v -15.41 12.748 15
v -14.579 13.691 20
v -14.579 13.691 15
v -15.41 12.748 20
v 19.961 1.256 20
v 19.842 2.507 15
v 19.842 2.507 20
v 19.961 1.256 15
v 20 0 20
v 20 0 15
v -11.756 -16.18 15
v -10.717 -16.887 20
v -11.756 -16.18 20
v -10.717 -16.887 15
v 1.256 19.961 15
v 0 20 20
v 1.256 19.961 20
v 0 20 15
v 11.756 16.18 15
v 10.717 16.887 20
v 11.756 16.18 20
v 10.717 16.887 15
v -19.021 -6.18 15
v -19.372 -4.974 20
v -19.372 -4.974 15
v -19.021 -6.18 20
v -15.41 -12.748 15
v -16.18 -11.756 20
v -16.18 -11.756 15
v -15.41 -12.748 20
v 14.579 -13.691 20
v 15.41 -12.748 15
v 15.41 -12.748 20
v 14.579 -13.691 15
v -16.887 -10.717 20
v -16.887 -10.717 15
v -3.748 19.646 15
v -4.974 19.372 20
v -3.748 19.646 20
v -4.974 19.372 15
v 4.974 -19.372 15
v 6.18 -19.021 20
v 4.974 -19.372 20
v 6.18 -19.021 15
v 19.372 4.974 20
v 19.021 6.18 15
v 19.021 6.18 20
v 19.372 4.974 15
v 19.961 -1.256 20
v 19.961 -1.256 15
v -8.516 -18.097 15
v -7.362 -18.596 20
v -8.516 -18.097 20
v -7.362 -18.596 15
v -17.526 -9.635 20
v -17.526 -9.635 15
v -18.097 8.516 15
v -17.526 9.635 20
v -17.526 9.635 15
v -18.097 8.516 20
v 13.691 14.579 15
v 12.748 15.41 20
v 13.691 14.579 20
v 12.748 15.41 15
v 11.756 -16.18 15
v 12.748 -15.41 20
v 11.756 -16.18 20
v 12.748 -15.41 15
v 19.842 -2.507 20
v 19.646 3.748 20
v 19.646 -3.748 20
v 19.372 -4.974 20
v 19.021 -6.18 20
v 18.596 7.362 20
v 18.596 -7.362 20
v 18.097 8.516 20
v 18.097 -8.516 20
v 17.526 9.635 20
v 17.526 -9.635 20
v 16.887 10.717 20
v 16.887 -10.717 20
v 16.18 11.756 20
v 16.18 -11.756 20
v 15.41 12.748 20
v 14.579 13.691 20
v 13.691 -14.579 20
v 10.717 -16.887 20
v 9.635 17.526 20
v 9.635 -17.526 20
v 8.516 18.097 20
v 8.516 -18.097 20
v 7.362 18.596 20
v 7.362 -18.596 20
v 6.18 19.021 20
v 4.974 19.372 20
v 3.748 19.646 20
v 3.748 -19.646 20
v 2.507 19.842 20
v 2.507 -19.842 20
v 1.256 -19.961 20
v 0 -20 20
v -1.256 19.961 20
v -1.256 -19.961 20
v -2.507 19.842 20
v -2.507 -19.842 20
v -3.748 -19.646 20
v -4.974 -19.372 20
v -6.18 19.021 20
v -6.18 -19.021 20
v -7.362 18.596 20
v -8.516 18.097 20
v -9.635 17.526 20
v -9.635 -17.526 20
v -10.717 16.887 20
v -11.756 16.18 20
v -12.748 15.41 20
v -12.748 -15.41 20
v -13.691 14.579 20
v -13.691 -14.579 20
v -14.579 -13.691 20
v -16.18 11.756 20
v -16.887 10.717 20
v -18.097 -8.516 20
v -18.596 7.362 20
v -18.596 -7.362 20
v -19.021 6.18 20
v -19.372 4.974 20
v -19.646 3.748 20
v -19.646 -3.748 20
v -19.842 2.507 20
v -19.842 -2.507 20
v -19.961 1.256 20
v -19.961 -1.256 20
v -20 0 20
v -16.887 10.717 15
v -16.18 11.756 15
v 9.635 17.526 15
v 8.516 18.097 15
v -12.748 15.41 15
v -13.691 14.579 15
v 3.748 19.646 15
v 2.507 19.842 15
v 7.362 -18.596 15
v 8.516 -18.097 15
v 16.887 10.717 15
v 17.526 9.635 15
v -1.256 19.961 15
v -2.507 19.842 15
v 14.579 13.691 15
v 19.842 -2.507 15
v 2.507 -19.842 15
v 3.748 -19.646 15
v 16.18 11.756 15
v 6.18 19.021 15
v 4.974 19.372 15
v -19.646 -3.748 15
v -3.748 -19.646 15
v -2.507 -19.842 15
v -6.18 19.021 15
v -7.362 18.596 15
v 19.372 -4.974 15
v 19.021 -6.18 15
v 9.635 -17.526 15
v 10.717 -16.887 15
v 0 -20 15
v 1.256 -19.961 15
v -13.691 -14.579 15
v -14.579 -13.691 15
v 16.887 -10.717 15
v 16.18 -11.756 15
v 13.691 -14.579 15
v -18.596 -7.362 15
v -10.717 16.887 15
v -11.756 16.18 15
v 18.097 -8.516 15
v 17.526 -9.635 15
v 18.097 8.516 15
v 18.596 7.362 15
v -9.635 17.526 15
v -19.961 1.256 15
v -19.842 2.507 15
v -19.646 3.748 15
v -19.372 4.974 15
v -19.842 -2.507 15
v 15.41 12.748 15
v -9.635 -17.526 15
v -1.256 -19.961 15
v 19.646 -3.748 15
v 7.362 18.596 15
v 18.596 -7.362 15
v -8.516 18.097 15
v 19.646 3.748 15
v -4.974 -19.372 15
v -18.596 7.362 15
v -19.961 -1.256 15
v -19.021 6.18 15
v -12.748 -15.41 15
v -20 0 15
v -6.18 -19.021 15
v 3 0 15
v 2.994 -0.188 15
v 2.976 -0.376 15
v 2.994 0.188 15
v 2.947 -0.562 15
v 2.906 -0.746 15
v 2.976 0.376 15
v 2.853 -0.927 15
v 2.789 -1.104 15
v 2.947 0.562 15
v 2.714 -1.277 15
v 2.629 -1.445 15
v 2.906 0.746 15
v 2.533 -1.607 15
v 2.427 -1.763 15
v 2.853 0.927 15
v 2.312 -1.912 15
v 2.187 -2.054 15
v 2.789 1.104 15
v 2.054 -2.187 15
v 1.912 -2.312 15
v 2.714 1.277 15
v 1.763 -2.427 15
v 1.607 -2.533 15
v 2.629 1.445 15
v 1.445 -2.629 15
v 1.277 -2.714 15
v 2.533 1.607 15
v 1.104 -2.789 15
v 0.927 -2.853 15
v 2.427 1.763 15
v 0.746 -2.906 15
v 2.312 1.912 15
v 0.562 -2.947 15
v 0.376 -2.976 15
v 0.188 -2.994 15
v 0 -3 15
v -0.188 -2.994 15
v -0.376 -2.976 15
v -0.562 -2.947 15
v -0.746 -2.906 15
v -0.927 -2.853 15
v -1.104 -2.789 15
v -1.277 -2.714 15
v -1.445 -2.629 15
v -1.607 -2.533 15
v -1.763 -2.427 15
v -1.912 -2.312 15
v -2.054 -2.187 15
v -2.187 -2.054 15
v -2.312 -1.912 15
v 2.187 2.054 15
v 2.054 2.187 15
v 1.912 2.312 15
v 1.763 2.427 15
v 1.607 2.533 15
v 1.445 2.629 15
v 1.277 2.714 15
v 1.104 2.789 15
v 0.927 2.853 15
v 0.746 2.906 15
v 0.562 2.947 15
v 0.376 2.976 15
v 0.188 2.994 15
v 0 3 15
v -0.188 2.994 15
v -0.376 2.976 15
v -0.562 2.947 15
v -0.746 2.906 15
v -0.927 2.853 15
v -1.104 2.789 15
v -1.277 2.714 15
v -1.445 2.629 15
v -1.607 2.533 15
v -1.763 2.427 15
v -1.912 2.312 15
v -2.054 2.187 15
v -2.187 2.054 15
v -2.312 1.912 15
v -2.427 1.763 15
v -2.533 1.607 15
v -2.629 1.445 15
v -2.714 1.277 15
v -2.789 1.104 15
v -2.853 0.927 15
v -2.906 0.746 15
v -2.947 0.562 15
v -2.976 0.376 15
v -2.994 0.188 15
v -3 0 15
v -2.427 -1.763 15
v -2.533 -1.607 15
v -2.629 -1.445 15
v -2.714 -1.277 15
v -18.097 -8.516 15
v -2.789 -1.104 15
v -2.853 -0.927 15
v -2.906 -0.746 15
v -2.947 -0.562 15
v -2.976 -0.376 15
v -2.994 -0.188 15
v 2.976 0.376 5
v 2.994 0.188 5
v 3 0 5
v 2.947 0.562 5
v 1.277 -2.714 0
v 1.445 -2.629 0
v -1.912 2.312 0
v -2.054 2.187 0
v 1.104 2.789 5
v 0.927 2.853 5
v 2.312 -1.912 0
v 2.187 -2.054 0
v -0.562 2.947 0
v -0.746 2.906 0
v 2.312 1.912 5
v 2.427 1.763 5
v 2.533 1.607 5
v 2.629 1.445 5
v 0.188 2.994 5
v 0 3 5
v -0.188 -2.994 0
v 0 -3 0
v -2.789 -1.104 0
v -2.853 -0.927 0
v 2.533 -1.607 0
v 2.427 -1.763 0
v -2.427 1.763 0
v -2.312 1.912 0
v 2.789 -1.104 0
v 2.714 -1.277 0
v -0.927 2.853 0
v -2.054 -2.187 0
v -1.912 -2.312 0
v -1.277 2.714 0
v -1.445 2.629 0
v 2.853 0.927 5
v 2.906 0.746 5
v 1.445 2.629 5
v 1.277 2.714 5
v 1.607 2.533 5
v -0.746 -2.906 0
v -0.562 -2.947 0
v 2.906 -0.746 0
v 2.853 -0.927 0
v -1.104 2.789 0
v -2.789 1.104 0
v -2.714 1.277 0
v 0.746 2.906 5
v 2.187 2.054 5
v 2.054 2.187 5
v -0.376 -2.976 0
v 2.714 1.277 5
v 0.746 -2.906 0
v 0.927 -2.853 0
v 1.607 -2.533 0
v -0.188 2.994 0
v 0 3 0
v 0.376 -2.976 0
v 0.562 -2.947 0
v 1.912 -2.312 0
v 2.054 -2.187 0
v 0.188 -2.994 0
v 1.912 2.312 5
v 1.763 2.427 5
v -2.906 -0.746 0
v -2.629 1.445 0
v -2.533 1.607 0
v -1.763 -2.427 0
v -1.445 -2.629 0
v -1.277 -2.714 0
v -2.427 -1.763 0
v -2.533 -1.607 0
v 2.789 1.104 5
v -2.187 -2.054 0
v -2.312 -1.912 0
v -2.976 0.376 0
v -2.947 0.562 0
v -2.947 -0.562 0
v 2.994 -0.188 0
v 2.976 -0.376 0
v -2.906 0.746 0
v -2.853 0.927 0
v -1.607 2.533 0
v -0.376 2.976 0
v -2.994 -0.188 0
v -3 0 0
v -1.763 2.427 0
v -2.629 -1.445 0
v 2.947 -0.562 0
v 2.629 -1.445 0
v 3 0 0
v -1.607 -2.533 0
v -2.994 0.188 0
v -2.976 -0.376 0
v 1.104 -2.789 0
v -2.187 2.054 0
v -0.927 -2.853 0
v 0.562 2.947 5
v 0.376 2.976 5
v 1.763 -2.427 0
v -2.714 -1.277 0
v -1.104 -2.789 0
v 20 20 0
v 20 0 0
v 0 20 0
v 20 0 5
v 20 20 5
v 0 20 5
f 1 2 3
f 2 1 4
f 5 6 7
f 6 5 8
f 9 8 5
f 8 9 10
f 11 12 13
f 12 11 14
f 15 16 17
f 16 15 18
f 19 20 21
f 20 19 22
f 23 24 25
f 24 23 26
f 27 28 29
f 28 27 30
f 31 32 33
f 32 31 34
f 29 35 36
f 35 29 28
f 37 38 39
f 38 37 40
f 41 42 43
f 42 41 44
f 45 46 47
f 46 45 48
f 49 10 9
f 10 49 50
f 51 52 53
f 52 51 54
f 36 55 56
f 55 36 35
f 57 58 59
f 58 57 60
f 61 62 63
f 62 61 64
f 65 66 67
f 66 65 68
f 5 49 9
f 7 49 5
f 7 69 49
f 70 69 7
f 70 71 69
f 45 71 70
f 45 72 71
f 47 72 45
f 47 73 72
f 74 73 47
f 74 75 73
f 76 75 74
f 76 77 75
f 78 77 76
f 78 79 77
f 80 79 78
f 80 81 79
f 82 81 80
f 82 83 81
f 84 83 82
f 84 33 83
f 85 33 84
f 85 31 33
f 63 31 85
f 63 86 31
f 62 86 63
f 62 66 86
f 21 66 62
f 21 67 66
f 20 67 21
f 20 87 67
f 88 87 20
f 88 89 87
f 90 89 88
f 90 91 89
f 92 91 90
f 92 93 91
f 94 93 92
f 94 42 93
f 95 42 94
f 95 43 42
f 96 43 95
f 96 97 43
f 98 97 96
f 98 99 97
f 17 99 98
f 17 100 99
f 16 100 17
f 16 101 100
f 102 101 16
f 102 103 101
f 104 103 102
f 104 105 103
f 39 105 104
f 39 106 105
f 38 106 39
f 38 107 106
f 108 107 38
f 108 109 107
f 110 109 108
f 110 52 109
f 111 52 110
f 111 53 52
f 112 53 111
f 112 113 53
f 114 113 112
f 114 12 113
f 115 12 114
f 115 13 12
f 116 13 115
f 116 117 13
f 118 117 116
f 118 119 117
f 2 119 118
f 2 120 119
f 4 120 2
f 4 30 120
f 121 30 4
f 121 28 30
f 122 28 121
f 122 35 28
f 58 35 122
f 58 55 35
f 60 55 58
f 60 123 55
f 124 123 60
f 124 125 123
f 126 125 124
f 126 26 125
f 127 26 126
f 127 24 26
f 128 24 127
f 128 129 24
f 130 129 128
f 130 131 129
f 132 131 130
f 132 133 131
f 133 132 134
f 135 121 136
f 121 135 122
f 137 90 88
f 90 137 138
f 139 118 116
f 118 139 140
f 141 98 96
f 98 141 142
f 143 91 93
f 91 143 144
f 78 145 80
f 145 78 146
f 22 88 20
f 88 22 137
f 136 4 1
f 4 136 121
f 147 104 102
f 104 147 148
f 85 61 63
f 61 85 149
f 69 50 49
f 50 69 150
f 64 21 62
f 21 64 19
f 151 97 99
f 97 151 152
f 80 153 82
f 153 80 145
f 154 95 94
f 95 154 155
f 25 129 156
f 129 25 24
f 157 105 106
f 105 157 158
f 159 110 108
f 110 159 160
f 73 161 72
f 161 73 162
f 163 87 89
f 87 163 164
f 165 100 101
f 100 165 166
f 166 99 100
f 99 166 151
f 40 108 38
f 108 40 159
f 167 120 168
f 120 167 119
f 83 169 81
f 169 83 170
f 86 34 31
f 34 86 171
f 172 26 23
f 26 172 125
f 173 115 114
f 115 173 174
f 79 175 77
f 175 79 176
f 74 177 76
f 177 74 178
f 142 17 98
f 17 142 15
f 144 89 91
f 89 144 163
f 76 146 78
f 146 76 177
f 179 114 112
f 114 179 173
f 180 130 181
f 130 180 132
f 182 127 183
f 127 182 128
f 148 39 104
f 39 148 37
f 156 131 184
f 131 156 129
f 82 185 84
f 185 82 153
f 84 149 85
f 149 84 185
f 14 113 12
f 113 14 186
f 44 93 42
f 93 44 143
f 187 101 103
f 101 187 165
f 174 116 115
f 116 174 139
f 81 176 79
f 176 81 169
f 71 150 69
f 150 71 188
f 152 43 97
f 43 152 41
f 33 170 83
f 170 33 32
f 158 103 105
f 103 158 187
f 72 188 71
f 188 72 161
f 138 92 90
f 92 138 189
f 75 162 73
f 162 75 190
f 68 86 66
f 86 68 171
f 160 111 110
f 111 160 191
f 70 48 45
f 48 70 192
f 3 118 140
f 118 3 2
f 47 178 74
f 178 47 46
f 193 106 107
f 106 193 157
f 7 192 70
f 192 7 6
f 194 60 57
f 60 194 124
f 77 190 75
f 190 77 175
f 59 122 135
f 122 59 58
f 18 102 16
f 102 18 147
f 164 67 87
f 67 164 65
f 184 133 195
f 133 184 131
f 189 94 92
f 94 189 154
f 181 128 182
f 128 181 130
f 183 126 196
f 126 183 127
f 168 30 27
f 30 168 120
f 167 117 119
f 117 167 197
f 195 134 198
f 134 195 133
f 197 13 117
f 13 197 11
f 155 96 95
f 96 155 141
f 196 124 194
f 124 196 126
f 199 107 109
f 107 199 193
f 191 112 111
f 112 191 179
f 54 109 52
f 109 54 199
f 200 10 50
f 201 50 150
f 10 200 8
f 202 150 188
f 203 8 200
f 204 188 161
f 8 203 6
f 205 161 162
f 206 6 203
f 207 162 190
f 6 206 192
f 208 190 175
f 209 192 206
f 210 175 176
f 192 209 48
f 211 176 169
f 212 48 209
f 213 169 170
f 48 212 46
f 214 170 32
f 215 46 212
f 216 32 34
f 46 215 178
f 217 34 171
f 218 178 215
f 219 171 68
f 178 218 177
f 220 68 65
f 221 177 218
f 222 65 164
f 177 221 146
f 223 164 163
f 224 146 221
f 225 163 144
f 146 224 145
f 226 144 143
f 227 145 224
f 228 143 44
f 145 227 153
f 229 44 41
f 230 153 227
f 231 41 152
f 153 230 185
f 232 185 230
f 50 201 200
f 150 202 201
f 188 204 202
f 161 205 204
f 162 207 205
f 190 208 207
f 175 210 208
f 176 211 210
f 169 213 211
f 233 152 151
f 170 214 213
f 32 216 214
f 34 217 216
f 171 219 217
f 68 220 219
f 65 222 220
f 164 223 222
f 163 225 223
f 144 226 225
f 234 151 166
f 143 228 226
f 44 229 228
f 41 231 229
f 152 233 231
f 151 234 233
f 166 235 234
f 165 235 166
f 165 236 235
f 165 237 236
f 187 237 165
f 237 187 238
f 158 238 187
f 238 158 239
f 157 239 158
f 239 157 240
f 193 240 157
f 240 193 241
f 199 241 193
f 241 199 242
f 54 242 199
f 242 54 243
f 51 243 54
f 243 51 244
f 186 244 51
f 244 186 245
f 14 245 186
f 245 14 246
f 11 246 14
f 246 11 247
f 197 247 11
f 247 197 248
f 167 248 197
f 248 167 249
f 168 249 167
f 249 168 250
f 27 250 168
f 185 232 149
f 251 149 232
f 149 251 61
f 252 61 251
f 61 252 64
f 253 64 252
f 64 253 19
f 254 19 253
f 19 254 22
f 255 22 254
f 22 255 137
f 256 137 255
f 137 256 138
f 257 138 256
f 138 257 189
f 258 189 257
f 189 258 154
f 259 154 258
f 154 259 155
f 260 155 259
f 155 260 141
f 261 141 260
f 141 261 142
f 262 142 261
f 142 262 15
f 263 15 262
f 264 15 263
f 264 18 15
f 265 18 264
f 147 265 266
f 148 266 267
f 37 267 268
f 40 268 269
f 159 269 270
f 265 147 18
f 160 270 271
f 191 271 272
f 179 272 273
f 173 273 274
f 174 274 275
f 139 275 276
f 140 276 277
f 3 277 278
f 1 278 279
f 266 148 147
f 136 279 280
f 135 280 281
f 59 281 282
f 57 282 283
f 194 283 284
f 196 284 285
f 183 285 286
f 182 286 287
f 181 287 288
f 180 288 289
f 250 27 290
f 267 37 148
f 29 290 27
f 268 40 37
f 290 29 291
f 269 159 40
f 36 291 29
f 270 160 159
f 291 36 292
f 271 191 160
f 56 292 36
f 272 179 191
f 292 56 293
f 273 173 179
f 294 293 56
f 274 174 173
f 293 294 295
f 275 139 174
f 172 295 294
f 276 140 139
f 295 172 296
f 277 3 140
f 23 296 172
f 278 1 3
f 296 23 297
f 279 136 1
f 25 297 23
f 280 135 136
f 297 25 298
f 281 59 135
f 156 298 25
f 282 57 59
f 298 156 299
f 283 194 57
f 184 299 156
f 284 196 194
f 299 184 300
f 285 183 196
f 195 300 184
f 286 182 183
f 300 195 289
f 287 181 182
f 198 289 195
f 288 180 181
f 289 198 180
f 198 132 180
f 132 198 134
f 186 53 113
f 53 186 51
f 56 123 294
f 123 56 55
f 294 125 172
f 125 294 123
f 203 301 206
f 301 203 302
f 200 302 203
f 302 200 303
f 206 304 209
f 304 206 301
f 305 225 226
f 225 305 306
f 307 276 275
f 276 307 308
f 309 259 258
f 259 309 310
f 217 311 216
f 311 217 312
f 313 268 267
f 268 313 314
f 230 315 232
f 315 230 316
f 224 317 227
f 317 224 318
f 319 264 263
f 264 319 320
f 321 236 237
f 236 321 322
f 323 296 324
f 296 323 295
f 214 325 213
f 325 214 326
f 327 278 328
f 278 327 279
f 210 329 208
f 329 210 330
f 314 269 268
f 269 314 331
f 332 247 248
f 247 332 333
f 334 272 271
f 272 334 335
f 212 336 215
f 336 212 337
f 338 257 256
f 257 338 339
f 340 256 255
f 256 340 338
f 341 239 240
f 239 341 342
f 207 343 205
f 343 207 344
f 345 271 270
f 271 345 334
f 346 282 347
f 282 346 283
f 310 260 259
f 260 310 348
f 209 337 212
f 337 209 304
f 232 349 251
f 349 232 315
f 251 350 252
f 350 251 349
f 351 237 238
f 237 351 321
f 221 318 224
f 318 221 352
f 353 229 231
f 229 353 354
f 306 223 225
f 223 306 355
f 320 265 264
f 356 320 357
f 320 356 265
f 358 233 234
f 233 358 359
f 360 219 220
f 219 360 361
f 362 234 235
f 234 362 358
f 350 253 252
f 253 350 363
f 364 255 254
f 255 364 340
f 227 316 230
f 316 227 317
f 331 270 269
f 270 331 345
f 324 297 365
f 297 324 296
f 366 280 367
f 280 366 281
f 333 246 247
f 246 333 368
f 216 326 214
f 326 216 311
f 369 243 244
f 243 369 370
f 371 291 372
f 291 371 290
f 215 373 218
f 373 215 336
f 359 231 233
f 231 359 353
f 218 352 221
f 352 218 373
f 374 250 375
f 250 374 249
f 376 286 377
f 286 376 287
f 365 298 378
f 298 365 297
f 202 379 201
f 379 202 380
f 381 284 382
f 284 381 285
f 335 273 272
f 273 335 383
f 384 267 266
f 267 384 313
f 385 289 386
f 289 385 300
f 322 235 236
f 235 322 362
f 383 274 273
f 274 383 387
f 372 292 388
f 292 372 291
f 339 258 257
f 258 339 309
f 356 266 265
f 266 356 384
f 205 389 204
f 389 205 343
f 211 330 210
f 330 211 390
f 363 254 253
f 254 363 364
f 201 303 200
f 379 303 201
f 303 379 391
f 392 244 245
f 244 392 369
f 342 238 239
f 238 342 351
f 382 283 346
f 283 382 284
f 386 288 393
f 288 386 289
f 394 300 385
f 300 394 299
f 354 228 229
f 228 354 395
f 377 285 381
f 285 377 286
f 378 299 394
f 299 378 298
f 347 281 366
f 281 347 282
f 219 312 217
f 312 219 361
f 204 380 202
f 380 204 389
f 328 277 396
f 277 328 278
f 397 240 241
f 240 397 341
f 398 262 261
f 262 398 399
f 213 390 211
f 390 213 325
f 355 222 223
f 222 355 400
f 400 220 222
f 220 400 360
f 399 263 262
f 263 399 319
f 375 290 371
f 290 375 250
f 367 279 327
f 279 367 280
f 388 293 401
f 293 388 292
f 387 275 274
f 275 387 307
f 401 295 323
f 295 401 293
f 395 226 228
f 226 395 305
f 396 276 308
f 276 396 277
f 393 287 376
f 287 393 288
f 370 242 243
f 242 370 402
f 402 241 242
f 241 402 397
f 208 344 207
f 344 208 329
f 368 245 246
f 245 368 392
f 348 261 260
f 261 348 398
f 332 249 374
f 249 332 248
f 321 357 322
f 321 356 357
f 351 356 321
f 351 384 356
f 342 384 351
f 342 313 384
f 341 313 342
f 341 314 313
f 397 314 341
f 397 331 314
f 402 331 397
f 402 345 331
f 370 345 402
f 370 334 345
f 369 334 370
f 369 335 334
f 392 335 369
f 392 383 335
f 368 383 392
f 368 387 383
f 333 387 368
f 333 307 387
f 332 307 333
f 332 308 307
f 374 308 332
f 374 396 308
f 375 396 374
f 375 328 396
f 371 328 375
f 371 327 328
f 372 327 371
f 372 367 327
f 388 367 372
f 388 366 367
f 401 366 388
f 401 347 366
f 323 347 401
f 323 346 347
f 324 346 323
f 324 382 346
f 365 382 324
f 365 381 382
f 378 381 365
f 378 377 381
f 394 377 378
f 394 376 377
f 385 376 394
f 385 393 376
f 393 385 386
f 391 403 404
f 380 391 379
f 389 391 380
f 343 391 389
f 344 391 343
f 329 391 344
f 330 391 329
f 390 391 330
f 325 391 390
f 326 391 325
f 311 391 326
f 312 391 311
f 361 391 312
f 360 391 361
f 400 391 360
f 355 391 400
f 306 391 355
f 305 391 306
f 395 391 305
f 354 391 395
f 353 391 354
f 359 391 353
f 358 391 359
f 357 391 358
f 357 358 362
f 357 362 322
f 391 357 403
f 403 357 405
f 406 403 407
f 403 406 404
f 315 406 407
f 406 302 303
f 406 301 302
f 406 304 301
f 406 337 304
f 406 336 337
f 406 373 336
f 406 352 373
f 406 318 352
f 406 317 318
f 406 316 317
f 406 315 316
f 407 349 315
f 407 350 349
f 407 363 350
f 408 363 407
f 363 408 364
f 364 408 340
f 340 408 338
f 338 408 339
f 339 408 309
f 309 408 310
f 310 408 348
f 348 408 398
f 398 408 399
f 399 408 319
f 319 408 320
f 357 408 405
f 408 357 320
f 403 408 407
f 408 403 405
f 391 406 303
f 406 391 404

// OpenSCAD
translate([0, 0, 15])
cylinder(r=20, h=5, $fn=100);
cylinder(r=3, h=16, $fn=100);
cube(size=[20, 20, 5]);
